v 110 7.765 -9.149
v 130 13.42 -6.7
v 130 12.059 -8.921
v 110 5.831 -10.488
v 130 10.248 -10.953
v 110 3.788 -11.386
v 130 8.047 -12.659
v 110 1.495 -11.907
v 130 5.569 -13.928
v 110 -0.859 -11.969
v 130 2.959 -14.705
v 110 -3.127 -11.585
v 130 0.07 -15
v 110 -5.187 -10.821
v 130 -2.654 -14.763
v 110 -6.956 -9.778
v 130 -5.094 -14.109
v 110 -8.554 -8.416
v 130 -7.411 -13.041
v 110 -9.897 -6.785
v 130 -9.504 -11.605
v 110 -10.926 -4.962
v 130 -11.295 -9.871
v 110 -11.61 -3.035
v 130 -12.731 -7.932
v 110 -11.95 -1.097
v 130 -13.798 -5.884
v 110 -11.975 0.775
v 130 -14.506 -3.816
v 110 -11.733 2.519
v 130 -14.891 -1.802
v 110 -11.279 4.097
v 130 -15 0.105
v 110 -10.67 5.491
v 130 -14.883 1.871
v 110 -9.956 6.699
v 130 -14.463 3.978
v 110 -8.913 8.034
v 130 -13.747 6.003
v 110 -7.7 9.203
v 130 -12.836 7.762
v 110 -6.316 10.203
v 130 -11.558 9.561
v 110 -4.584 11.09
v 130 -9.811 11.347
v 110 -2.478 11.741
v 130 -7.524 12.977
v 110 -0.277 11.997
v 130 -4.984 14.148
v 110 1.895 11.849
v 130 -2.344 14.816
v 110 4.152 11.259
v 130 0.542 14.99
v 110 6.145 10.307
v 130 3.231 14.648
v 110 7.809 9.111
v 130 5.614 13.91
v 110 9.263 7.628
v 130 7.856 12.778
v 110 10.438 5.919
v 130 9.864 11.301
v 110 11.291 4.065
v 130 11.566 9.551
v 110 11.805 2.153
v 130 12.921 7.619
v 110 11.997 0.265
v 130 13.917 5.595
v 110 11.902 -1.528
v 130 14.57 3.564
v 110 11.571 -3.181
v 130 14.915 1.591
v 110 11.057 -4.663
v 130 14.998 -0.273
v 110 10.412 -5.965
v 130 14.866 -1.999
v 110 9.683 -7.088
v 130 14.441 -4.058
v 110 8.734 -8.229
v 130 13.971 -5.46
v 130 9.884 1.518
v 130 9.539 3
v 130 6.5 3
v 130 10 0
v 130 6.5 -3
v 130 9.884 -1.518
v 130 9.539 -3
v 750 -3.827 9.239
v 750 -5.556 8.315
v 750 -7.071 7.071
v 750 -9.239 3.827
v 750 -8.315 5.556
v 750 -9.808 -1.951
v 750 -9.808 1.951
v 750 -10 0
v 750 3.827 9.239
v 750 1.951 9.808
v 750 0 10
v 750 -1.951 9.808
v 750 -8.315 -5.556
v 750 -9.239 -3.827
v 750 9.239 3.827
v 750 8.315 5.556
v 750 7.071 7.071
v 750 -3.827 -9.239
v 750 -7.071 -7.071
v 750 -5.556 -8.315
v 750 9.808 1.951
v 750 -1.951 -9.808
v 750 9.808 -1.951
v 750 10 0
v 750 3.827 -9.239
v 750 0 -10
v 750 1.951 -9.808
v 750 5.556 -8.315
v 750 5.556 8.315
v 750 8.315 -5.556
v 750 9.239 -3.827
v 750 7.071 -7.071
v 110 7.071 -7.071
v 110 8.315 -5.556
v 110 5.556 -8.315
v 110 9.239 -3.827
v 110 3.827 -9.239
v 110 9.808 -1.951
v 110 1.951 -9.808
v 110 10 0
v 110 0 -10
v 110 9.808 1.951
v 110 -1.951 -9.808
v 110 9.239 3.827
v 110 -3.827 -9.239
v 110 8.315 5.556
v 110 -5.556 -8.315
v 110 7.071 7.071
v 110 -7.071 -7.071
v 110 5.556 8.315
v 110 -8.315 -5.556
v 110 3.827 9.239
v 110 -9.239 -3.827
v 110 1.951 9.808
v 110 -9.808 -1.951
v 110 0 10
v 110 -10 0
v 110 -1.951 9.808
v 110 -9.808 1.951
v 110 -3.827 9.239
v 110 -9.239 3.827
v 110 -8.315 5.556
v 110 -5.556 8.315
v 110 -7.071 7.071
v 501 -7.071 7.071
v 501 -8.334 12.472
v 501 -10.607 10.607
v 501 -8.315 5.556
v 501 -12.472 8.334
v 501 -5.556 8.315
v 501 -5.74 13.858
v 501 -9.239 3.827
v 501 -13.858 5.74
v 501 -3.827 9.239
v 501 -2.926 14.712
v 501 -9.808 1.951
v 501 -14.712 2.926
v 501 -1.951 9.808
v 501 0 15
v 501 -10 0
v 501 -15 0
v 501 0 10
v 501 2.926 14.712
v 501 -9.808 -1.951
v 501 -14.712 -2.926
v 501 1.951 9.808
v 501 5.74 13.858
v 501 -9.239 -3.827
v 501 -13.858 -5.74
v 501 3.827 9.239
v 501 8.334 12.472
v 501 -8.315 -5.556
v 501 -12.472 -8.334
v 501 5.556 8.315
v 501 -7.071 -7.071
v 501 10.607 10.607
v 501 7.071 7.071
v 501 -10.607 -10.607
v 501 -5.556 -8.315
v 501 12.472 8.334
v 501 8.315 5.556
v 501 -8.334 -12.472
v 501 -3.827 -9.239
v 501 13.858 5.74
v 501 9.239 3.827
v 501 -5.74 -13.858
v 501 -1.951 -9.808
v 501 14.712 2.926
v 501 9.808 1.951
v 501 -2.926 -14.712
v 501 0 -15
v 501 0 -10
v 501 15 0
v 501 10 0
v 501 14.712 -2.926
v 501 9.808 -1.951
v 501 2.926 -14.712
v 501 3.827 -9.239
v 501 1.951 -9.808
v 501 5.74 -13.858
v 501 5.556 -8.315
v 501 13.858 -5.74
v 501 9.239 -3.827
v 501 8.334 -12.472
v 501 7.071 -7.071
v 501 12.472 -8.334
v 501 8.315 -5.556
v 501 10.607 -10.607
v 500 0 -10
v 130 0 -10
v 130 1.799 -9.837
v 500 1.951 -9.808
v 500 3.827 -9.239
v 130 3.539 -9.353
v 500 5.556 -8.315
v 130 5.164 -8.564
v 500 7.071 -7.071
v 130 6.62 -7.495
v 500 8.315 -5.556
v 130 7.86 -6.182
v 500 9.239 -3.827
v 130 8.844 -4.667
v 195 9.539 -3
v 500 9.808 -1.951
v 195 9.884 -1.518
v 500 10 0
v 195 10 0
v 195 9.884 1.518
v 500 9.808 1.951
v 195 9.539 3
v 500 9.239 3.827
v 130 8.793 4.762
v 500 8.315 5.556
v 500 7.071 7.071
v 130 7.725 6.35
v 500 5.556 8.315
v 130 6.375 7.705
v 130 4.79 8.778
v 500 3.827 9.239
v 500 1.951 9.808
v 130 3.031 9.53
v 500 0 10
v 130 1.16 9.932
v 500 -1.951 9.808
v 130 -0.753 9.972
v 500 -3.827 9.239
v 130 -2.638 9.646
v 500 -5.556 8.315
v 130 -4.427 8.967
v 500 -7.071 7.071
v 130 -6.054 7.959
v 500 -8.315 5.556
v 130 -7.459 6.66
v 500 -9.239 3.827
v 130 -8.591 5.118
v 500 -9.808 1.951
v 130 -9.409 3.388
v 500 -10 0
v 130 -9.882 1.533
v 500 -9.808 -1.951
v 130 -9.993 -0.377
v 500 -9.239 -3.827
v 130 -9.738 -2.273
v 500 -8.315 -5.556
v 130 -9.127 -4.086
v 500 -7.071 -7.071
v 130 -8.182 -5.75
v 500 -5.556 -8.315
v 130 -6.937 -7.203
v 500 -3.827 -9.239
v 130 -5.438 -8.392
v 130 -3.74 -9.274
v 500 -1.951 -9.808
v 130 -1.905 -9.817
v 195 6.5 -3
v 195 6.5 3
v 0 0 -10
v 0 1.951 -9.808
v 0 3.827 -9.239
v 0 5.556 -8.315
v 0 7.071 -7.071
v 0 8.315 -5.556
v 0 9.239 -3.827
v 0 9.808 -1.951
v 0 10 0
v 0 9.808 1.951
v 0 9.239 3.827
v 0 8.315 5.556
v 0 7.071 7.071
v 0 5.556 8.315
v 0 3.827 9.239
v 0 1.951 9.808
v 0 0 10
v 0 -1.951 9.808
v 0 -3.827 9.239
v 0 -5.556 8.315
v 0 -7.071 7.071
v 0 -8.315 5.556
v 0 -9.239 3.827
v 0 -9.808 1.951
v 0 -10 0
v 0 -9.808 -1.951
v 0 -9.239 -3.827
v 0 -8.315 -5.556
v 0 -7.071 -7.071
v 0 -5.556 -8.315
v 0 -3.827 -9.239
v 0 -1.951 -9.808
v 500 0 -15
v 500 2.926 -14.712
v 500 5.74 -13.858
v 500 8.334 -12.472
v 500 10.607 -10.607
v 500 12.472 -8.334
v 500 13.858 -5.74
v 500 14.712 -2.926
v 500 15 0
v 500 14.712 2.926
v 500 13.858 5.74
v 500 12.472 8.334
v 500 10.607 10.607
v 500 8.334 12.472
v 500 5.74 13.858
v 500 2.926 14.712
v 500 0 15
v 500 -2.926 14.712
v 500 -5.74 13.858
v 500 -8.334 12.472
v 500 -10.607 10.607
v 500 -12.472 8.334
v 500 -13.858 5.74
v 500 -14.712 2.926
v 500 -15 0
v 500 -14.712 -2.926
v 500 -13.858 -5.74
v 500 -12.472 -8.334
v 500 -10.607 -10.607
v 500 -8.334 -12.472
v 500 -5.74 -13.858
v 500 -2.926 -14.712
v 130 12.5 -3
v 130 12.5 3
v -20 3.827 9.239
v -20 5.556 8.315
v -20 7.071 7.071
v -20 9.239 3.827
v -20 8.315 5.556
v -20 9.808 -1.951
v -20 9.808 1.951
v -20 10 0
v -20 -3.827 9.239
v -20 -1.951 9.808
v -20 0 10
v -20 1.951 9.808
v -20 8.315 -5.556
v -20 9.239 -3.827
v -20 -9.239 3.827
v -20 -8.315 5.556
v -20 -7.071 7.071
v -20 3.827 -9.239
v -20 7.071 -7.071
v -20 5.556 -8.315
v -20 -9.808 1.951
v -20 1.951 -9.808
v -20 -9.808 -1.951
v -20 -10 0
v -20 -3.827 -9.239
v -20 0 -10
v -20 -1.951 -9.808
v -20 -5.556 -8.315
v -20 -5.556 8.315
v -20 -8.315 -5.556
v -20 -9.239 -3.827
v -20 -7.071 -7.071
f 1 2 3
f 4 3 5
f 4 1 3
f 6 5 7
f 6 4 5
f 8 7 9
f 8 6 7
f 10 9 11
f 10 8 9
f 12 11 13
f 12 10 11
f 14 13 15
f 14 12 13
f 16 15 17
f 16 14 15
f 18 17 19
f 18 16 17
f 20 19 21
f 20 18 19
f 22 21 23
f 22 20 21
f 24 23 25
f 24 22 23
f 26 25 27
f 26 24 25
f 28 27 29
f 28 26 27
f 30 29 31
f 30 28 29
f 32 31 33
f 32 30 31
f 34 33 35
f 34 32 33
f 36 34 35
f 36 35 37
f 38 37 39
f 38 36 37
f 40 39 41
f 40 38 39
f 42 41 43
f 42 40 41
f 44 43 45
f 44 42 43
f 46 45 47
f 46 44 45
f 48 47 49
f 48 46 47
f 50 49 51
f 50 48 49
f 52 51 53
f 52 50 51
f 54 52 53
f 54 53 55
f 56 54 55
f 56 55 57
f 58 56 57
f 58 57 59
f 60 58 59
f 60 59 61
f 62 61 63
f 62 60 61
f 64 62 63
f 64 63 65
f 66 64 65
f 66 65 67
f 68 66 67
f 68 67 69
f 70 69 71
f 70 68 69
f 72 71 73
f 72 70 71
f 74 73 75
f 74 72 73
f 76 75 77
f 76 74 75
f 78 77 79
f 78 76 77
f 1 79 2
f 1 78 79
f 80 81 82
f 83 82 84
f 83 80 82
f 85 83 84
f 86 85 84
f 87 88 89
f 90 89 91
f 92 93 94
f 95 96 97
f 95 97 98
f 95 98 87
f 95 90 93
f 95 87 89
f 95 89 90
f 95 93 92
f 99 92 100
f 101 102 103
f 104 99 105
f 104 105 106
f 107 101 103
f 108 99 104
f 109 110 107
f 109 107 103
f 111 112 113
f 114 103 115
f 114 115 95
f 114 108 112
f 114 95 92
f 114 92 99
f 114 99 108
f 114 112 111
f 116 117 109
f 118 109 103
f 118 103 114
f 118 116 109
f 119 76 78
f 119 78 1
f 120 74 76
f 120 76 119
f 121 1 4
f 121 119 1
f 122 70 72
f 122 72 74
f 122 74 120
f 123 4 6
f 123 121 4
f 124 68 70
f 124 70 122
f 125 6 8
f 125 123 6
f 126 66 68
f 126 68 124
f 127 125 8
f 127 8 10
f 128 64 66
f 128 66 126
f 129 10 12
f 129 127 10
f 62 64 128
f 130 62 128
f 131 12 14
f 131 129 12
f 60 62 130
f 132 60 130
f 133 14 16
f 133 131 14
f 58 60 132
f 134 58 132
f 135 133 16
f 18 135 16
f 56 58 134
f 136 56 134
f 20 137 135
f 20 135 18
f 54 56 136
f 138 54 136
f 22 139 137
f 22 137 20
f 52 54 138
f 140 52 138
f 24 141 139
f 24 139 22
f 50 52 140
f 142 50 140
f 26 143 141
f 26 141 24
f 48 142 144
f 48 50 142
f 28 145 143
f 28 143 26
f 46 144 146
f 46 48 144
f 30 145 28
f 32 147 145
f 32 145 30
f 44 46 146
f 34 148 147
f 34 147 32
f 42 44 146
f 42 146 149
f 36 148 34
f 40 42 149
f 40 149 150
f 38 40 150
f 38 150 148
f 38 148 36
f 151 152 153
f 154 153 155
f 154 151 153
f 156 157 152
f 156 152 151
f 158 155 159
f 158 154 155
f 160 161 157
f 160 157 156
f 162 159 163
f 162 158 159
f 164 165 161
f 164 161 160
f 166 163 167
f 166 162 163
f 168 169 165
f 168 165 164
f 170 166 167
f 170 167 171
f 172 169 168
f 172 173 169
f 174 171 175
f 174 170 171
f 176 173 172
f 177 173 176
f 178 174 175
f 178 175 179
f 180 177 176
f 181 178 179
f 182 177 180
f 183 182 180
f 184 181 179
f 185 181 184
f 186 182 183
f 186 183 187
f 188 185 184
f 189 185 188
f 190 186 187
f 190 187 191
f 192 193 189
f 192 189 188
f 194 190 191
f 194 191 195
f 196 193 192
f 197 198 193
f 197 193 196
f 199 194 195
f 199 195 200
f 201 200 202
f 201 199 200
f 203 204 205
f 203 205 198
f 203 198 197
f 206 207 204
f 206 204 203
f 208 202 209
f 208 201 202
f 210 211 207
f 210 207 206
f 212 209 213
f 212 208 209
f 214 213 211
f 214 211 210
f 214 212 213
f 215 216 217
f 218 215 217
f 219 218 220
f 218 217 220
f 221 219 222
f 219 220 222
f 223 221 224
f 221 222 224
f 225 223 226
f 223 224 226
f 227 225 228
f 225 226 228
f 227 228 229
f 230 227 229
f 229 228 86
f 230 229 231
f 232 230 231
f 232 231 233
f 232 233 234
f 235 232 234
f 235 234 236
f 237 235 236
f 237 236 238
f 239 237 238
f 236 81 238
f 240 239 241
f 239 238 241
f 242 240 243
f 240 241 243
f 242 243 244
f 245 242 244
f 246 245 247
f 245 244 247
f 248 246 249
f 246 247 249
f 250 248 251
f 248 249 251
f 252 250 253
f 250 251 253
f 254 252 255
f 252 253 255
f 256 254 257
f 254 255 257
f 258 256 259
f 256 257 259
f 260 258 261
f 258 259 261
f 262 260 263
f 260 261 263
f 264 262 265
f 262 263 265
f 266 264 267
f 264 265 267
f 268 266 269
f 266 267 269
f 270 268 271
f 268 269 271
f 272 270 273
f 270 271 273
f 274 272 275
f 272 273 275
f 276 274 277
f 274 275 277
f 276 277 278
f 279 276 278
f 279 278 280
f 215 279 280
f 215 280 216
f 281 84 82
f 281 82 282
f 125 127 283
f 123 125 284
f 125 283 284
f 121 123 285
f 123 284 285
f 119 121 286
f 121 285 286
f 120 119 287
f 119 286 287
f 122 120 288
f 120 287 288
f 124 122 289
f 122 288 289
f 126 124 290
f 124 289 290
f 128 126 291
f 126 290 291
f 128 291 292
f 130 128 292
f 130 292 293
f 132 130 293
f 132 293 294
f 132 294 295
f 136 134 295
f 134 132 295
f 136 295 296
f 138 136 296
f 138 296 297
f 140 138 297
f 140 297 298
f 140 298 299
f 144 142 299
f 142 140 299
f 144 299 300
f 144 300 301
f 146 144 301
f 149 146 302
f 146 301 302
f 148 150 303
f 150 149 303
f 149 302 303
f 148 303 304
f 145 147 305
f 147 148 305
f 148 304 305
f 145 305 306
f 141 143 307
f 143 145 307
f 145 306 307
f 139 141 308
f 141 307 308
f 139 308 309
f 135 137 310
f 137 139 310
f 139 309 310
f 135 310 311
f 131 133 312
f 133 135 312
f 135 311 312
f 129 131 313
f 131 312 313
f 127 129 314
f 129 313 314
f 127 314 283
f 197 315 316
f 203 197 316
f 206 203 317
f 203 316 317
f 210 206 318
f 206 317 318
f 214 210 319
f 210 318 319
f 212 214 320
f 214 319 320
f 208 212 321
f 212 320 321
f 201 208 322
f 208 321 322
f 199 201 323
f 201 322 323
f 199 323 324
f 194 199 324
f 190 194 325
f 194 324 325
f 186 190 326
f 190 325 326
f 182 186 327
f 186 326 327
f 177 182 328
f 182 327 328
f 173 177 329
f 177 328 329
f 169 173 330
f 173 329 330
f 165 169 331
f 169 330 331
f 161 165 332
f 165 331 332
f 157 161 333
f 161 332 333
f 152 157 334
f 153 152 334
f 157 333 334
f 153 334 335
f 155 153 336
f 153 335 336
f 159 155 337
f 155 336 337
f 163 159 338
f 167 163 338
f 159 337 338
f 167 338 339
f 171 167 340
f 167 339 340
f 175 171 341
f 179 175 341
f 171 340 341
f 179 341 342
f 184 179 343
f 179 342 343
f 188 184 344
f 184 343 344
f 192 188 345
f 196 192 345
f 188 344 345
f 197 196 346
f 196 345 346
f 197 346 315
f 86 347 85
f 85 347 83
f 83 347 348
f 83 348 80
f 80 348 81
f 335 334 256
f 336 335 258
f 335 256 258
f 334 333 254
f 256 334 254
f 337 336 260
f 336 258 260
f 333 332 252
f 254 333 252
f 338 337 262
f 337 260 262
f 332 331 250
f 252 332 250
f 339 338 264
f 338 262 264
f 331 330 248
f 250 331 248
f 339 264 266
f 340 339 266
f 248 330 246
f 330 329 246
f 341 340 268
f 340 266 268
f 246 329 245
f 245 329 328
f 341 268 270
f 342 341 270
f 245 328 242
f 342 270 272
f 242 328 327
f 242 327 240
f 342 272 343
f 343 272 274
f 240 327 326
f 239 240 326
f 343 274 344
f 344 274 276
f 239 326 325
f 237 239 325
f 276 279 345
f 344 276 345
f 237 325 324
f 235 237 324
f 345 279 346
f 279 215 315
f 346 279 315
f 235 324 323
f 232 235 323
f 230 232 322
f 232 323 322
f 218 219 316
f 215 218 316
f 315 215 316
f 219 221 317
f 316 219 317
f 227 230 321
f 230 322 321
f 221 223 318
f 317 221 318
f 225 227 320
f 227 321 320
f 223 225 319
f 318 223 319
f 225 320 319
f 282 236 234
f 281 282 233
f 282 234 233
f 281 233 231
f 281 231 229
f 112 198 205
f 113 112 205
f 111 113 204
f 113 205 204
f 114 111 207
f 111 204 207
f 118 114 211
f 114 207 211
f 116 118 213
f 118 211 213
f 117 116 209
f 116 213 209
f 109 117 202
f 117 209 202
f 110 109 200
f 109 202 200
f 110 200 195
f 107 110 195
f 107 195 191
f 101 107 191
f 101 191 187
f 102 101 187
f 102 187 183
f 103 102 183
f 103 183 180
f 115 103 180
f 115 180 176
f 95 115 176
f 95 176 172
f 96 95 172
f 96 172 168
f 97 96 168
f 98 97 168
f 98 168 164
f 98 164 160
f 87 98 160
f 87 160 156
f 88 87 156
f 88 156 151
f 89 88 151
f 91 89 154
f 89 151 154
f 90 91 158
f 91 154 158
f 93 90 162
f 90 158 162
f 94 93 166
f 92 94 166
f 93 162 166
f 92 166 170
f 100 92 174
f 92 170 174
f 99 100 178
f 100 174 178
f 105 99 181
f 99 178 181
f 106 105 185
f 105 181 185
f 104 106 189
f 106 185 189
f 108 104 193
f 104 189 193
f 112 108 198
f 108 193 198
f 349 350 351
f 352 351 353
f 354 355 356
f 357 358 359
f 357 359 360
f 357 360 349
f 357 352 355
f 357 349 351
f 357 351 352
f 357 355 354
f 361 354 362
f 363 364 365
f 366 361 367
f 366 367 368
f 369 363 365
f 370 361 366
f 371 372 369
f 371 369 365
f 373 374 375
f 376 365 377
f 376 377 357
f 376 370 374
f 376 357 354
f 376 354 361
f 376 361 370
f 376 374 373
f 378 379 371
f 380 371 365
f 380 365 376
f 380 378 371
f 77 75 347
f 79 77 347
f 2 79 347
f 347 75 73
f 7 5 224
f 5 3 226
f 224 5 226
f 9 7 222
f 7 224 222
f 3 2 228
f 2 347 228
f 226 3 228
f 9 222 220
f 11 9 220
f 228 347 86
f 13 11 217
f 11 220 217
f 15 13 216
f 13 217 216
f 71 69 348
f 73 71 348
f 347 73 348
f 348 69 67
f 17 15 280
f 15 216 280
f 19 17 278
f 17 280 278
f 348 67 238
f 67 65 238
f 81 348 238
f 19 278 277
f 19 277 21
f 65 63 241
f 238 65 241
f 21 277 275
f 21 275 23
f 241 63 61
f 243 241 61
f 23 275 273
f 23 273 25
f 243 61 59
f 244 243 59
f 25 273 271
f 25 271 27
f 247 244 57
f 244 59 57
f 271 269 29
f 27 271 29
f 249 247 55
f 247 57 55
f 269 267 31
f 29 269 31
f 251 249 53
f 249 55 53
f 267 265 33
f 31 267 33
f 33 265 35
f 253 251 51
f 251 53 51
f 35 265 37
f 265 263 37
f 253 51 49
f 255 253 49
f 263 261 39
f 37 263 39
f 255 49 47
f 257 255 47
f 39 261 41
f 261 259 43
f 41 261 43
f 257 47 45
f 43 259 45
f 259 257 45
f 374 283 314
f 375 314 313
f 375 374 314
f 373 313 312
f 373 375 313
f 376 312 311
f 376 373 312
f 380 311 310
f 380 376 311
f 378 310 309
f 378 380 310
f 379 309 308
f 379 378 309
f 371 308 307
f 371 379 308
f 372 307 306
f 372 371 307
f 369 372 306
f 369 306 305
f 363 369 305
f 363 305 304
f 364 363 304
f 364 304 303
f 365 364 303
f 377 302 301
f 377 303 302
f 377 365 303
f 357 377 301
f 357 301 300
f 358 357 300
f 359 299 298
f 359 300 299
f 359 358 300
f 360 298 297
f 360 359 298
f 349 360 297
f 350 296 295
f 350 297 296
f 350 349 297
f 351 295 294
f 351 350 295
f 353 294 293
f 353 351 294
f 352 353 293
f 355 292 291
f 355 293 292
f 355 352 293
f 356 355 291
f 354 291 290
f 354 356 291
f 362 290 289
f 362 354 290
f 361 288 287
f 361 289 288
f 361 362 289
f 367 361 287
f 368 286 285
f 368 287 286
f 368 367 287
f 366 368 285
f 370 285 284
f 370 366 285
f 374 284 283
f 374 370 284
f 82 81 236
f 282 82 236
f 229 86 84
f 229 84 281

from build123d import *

# Parameters (mm, degrees)
SKETCH3_R           = 10
BOSS_EXTRUDE1_DEPTH = 750
SKETCH6_R           = 15
BOSS_EXTRUDE2_DEPTH = 1
BOSS_EXTRUDE3_START = 20
SKETCH7_R           = 10
BOSS_EXTRUDE3_DEPTH = 20
SKETCH8_W           = 65
SKETCH8_H           = 6
CUT_EXTRUDE1_DEPTH  = 6


with BuildPart() as part:
    # Sketch3 → Boss-Extrude1 (new body)
    with BuildSketch(Plane(origin=(0, 0, 0), x_dir=(0, 0, -1), z_dir=(1, 0, 0))):
        Circle(SKETCH3_R)
    extrude(amount=BOSS_EXTRUDE1_DEPTH)

    # Loft1: read off the stored shape, not the designer's step
    # Loft1: loft between two sections, ruled curve by curve
    loft1_from = [
        Edge.make_bspline([(130, 13.420275273, -6.700463537), (130, 0.019348199, -33.541014082), (130, -26.821202346, -20.140087008), (130, -13.420275273, 6.700463537), (130, -0.019348199, 33.541014082), (130, 26.821202346, 20.140087008), (130, 13.420275273, -6.700463537)], [0, 0, 0, 0, 0.5, 0.5, 0.5, 1, 1, 1, 1], 3, [1, 0.333333333, 0.333333333, 1, 0.333333333, 0.333333333, 1]),
    ]
    loft1_to = [
        Edge.make_bspline([(110, 7.764671539, -9.149310132), (110, -10.533948725, -24.67865321), (110, -26.063291803, -6.380032946), (110, -7.764671539, 9.149310132), (110, 10.533948725, 24.67865321), (110, 26.063291803, 6.380032946), (110, 7.764671539, -9.149310132)], [0, 0, 0, 0, 0.5, 0.5, 0.5, 1, 1, 1, 1], 3, [1, 0.333333333, 0.333333333, 1, 0.333333333, 0.333333333, 1]),
    ]
    loft1 = Solid(Shell([*[Face.make_surface_from_curves(loft1_from[k], loft1_to[k]) for k in range(1)], Face(Wire(loft1_from)), Face(Wire(loft1_to))]))
    add(loft1)

    # Sketch6 → Boss-Extrude2 (add)
    with BuildSketch(Plane(origin=(500, 0, 0), x_dir=(0, 0, -1), z_dir=(1, 0, 0))):
        Circle(SKETCH6_R)
    extrude(amount=BOSS_EXTRUDE2_DEPTH)

    # Sketch7 → Boss-Extrude3 (add)
    with BuildSketch(Plane.ZY.offset(BOSS_EXTRUDE3_START)):
        with Locations(Location((0, 0, 0), (0, 0, 180))):
            Circle(SKETCH7_R)
    extrude(amount=-BOSS_EXTRUDE3_DEPTH)

    # Sketch8 → Cut-Extrude1 (cut)
    with BuildSketch(Plane(origin=(0, 12.5, 0), x_dir=(1, 0, 0), z_dir=(0, 1, 0))):
        with Locations((162.5, 0)):
            Rectangle(SKETCH8_W, SKETCH8_H)
    extrude(amount=-CUT_EXTRUDE1_DEPTH, mode=Mode.SUBTRACT)


solid = part.part
